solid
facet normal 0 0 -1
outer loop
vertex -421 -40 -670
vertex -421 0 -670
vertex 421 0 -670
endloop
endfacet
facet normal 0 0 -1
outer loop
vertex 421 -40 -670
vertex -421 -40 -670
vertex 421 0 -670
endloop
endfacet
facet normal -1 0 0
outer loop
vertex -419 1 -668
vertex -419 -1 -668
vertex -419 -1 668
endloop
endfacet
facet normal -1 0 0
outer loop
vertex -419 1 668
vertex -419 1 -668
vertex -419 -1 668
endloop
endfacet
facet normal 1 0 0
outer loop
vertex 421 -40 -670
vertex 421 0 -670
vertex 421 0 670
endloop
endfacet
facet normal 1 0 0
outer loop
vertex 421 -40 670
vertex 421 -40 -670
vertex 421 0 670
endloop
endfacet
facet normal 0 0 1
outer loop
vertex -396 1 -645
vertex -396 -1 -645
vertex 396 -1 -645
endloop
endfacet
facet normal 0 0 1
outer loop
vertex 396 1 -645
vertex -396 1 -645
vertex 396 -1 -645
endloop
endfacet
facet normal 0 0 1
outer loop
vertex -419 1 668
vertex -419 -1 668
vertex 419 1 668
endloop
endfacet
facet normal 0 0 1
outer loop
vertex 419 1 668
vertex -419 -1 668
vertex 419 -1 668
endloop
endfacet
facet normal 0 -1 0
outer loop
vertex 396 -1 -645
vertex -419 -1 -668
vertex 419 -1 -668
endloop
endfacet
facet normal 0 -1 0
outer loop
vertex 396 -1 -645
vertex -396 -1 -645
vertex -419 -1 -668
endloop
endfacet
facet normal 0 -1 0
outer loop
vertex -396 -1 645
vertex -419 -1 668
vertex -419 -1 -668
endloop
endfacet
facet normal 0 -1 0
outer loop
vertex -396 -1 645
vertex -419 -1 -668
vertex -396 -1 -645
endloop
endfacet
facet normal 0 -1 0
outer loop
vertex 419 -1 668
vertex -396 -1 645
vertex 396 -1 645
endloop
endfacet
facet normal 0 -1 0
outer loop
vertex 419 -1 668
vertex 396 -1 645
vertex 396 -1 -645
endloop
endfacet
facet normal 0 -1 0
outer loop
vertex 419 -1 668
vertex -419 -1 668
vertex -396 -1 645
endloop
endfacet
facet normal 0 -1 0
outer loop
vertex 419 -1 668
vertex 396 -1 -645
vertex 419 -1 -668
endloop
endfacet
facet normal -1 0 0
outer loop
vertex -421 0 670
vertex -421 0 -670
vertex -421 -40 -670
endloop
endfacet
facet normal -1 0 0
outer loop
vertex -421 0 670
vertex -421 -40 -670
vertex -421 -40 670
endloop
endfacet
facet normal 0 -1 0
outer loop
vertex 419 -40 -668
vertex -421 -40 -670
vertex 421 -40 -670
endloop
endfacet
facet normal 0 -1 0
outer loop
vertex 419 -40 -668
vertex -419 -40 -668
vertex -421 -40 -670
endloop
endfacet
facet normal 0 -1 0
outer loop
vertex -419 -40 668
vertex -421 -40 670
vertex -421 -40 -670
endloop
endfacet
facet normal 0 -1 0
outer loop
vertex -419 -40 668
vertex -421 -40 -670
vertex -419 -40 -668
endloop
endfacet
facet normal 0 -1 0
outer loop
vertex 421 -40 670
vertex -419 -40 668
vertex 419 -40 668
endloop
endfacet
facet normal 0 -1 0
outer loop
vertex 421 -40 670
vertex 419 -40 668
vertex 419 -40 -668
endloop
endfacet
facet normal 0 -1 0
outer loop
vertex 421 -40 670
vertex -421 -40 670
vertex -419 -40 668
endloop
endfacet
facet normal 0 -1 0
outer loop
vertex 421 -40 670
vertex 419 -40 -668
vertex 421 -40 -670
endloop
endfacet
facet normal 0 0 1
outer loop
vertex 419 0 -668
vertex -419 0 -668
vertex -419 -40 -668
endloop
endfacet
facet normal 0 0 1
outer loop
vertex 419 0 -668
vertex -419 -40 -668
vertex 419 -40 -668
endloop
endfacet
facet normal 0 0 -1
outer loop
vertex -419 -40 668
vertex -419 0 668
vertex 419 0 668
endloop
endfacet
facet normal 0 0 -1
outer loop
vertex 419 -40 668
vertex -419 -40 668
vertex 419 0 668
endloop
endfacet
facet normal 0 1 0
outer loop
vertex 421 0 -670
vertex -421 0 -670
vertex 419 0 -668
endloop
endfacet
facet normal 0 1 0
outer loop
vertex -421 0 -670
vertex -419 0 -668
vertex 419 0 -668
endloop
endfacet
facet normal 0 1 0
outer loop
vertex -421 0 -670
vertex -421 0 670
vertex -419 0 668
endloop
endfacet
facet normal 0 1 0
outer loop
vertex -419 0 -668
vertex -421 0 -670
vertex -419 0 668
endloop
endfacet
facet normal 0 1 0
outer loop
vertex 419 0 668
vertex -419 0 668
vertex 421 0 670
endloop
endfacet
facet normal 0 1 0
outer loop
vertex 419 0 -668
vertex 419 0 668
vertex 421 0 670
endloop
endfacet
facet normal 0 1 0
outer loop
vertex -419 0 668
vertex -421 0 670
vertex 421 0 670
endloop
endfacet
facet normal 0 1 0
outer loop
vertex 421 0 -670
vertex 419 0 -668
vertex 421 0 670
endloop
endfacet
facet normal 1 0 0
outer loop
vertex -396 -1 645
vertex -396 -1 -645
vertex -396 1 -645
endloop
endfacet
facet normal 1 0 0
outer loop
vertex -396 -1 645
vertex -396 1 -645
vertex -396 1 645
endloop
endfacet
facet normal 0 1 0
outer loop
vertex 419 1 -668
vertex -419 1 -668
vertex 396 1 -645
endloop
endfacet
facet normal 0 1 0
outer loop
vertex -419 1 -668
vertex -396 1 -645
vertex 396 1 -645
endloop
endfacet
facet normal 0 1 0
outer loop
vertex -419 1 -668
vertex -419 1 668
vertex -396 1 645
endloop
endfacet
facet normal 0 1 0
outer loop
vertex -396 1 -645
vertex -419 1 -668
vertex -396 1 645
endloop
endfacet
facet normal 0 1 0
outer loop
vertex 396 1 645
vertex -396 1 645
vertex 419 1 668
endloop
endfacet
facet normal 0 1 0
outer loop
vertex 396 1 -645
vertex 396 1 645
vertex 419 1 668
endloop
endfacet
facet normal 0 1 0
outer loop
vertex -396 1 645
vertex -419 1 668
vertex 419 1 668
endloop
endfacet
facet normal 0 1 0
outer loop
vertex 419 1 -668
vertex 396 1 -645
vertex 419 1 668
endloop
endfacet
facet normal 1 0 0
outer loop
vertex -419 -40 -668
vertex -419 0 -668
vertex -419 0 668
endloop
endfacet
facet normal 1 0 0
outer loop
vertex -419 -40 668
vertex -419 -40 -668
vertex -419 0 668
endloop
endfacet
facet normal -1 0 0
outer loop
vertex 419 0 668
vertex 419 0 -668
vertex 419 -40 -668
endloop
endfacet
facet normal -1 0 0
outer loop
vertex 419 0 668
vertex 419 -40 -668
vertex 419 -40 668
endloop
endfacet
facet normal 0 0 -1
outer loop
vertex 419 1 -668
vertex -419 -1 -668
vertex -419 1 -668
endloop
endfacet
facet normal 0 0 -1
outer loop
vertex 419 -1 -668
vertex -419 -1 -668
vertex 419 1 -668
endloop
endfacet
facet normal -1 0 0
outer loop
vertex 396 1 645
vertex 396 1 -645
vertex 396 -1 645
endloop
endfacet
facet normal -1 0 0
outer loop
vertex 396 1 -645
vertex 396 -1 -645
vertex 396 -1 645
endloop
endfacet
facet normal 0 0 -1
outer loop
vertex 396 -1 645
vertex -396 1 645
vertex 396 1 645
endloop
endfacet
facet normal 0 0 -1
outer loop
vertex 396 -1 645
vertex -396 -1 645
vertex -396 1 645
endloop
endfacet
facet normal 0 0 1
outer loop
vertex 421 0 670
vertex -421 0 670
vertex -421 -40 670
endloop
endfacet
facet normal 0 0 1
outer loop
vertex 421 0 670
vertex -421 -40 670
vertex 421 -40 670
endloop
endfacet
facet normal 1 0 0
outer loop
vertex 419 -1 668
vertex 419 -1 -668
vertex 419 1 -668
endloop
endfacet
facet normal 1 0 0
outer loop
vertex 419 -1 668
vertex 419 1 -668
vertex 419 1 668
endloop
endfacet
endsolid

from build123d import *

# Parameters (mm, degrees)
F0_W     = 838
F0_H     = 1336
F0_W_2   = 792
F0_H_2   = 1290
F1_DEPTH = 1
F2_W     = 842
F2_H     = 1340
F2_W_2   = 838
F2_H_2   = 1336
F3_DEPTH = 40


with BuildPart() as f1:
    # F0 (on Front) → F1 (new body, symmetric)
    with BuildSketch(Plane.XZ):
        Rectangle(F0_W, F0_H)
        Rectangle(F0_W_2, F0_H_2, mode=Mode.SUBTRACT)
    extrude(amount=F1_DEPTH, both=True)


with BuildPart() as f3:
    # F2 (on face) → F3 (new body)
    with BuildSketch(Plane.XZ):
        Rectangle(F2_W, F2_H)
        Rectangle(F2_W_2, F2_H_2, mode=Mode.SUBTRACT)
    extrude(amount=F3_DEPTH)


solid = Compound([f1.part, f3.part])
